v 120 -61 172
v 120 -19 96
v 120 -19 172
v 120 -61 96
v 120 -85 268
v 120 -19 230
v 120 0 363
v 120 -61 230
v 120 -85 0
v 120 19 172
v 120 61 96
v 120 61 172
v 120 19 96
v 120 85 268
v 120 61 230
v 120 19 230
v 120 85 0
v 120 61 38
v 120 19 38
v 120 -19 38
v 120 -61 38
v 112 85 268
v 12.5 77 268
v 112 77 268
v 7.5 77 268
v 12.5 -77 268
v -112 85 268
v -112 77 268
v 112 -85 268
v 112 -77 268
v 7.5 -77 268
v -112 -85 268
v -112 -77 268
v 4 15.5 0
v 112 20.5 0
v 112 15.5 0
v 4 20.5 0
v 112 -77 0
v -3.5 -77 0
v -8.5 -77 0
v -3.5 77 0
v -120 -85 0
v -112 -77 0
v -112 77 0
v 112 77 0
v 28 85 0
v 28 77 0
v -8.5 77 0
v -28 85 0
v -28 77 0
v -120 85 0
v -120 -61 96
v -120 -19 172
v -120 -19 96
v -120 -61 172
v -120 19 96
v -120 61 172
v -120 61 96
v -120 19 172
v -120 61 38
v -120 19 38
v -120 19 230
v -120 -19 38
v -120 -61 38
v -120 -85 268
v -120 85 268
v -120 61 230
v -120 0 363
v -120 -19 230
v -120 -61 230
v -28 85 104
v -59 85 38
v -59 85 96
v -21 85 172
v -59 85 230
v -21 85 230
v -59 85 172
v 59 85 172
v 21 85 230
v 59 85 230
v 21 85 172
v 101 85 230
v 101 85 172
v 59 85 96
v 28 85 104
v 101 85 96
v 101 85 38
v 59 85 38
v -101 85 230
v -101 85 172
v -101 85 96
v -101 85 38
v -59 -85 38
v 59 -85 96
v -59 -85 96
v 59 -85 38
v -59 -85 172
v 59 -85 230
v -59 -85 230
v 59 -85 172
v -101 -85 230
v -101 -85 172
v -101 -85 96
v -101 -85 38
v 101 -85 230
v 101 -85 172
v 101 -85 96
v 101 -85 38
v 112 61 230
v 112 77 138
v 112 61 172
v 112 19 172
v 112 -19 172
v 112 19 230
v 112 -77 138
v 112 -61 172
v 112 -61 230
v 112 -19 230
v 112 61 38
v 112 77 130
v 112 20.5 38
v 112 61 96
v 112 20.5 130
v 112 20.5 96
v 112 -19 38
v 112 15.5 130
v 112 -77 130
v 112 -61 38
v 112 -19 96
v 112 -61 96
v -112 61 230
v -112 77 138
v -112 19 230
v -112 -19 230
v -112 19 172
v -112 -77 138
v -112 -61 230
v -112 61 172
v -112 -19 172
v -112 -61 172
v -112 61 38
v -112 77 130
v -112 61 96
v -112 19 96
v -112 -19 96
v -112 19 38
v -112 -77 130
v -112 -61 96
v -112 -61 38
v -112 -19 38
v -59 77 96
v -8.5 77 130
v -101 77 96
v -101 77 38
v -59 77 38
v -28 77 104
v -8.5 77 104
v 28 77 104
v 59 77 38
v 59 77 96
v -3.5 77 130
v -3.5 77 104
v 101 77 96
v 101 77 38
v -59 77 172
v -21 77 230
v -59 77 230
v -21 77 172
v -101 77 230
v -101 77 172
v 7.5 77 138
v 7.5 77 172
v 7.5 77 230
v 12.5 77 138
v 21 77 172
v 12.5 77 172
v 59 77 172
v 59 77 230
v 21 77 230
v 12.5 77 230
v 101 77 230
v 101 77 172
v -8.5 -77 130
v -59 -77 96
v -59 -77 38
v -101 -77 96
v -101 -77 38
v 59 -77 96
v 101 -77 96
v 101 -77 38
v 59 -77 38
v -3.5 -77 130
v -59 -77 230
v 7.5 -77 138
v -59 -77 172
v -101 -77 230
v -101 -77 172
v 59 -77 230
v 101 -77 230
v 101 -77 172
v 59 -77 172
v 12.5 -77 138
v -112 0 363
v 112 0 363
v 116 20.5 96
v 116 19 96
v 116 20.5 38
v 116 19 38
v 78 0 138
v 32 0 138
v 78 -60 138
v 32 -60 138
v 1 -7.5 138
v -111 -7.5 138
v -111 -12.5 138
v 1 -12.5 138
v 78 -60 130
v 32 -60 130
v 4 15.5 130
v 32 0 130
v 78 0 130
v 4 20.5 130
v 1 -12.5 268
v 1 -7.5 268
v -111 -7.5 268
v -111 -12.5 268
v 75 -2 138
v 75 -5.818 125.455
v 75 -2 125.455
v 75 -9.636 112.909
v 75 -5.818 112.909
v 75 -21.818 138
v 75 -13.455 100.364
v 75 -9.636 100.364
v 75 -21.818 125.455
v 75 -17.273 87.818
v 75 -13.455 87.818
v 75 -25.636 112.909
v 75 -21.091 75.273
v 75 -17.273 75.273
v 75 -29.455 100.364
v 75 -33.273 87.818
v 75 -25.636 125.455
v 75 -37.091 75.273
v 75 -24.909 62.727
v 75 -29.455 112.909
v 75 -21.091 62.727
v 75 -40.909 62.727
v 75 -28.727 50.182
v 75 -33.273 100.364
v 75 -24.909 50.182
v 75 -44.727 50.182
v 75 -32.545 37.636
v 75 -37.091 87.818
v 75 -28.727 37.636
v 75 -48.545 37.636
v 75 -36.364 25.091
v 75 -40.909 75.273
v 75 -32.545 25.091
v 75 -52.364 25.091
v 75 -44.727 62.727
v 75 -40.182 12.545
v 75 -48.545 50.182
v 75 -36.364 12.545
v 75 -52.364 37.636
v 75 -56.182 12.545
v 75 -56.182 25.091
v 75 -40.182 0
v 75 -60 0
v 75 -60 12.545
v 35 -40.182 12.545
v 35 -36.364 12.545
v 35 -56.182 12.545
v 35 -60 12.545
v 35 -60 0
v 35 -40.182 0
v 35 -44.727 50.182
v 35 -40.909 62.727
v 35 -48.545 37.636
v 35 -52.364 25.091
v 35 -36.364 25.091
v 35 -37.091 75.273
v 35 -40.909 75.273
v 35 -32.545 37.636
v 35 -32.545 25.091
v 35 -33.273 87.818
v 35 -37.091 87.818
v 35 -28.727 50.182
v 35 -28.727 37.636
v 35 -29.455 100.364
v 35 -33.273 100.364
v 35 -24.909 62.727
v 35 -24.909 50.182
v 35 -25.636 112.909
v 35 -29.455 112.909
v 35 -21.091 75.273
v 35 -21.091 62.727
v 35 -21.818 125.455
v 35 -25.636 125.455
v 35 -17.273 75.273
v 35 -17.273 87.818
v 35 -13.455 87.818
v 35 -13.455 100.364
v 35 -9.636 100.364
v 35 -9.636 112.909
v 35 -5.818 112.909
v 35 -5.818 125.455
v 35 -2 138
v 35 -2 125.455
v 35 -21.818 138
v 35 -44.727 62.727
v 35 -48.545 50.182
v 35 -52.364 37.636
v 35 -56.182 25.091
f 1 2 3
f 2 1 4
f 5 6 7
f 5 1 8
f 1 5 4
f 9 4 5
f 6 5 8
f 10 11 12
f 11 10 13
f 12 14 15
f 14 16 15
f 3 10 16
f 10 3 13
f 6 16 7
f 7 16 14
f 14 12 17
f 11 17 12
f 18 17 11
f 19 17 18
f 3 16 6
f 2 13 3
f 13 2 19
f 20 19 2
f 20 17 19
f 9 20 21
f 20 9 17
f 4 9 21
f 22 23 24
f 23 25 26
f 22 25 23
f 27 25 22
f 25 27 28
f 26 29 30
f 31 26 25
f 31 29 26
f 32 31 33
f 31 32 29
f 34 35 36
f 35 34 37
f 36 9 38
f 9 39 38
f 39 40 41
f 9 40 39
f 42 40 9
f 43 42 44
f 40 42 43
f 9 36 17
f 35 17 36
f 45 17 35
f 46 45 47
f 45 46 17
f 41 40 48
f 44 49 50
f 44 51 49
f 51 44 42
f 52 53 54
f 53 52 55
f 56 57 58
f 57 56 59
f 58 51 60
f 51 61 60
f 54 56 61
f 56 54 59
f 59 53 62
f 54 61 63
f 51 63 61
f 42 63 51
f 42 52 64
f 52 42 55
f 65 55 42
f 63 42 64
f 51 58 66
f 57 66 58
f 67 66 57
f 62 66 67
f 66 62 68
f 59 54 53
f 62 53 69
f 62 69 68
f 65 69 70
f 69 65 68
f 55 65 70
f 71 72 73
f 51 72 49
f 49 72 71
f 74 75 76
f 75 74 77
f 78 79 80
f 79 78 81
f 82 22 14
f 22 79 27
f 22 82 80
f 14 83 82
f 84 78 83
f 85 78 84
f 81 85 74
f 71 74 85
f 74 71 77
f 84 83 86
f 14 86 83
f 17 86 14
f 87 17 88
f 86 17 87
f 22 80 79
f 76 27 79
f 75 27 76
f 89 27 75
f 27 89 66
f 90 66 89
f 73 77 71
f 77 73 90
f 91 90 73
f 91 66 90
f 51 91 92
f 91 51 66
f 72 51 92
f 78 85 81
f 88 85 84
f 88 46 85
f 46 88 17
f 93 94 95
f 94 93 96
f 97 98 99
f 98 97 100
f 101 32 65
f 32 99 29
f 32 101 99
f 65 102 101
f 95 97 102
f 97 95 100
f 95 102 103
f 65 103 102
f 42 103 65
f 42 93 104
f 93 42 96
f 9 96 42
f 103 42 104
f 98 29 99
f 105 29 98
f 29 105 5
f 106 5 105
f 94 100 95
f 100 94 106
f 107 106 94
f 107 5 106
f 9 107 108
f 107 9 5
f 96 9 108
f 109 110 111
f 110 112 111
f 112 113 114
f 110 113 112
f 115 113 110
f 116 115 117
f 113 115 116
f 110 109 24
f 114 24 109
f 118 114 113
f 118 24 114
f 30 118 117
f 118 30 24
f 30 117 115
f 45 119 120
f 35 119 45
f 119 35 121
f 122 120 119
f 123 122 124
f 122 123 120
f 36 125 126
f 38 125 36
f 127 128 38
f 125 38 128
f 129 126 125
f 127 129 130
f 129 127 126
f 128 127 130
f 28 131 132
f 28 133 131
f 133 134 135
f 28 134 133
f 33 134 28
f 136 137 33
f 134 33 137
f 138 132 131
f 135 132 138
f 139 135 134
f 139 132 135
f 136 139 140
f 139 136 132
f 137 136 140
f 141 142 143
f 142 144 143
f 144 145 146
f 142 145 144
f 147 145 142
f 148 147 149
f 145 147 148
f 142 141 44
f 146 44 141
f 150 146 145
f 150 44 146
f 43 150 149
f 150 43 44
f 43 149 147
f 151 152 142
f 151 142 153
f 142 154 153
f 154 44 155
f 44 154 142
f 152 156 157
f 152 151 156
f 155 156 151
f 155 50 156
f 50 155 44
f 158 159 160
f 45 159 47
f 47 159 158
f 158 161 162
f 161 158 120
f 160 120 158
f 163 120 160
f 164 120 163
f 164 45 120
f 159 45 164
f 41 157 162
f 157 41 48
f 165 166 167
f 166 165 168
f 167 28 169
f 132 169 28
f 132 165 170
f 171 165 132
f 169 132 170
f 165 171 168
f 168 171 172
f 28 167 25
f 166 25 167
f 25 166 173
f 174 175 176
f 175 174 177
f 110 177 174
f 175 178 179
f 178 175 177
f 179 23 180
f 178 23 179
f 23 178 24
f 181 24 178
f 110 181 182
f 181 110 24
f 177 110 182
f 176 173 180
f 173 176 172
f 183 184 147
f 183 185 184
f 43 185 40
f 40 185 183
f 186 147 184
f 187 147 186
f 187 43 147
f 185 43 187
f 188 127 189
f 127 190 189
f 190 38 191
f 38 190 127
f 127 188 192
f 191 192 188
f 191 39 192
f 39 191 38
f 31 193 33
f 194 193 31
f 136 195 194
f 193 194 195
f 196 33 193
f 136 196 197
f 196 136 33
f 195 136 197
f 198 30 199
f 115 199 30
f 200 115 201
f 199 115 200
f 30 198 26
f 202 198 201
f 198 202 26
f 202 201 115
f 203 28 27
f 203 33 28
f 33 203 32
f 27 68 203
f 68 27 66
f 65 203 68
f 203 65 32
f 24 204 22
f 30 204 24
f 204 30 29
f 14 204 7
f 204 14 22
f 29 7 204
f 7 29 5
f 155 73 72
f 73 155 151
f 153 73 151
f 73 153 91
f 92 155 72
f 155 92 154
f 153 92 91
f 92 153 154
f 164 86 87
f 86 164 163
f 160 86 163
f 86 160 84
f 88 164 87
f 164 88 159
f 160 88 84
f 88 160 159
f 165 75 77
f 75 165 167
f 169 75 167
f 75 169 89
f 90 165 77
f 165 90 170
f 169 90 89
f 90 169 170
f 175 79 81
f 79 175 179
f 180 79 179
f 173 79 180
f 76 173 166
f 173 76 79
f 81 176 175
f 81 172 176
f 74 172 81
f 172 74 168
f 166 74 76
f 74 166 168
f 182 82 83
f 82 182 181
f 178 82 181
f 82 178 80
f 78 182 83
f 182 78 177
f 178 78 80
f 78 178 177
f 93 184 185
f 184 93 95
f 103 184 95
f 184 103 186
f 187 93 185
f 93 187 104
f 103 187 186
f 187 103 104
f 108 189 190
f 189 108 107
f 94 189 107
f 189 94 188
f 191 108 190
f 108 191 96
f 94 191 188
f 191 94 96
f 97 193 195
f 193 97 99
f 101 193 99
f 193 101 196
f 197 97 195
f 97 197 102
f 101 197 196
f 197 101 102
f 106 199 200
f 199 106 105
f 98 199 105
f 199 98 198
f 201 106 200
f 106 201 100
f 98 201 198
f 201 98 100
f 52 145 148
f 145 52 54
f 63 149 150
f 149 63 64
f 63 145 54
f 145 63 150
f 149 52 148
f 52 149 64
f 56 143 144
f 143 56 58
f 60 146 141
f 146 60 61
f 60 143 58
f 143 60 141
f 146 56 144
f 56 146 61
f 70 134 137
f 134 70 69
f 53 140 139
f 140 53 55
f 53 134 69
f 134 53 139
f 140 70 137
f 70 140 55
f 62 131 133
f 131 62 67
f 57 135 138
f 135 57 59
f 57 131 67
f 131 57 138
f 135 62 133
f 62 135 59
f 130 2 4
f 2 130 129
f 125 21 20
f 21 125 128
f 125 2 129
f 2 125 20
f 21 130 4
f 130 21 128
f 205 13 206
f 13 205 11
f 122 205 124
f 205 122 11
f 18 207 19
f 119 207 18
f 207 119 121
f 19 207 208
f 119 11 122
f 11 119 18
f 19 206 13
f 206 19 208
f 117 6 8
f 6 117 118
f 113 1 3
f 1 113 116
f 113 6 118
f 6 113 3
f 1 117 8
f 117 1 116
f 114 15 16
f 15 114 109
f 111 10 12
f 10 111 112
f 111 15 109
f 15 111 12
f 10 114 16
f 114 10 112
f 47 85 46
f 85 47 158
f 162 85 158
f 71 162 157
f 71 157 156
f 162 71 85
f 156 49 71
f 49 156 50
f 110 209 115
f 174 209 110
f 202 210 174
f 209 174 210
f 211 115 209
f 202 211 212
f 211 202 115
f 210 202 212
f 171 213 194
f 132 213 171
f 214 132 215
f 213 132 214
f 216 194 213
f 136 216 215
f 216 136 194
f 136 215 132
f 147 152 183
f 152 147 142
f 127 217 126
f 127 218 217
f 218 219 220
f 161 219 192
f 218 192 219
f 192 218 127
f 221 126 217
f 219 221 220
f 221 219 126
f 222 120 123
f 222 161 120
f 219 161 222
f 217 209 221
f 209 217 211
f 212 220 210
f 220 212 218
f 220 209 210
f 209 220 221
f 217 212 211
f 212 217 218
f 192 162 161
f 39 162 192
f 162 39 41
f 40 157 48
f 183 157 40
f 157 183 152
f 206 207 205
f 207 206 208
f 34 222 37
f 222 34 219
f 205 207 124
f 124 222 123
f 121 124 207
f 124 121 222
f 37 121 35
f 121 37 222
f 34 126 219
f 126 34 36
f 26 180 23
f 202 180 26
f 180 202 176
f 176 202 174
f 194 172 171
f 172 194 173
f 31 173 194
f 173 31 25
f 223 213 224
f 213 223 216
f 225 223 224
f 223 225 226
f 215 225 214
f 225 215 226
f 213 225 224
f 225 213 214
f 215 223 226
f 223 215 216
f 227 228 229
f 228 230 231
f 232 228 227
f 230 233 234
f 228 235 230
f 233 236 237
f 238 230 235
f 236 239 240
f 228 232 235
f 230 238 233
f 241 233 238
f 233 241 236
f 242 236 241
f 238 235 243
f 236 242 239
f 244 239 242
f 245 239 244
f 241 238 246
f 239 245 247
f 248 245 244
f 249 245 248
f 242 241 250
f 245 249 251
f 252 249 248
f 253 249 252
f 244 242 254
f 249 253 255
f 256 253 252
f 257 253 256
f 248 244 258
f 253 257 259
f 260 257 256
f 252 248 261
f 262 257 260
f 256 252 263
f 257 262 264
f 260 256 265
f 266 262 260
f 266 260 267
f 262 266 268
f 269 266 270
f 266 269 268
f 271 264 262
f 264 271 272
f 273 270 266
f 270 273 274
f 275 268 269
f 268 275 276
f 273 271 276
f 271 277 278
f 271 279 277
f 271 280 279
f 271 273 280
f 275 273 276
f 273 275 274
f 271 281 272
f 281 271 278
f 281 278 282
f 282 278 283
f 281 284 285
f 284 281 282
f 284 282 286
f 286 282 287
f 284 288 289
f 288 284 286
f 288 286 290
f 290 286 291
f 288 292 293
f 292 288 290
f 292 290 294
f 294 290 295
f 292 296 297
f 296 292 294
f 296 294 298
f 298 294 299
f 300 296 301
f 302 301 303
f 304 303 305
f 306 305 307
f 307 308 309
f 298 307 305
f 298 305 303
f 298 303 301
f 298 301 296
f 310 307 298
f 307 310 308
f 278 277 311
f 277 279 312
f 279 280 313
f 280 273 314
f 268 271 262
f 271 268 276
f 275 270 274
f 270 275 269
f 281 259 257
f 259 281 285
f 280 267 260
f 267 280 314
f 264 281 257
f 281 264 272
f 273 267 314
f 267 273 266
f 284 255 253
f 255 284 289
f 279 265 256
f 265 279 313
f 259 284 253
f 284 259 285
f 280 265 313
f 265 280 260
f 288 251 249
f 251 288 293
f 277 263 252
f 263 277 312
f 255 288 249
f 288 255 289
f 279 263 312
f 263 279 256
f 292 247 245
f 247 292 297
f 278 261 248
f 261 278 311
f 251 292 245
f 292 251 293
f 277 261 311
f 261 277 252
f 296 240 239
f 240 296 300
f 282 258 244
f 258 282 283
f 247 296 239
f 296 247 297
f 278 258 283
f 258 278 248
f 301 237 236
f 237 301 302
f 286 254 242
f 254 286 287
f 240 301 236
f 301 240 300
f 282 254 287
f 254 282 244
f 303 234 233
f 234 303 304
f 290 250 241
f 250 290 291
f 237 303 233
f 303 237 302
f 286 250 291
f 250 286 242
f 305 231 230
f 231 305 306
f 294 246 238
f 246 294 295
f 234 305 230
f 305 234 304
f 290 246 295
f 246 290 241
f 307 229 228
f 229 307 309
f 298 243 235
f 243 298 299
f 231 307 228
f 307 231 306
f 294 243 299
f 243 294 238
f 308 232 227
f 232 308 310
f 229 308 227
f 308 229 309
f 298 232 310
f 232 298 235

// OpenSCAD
// file: common.scad
// Shared parameters and placement helpers for the dollhouse.
// `include`d by every component file so variables AND helper modules propagate.

$fa = 2;
$fs = 0.5;
eps = 0.1;

// ---- Core house dimensions (mm) ----
house_w = 240;          // width  (X)
house_d = 170;          // depth  (Y)
wall_t  = 8;            // exterior wall thickness
floor_h = 130;          // interior storey height
mid_t   = 8;            // mid-floor slab thickness
wall_height = floor_h * 2 + mid_t;   // 268
half_depth  = house_d / 2;           // 85

// ---- Roof ----
gable_rise = 95;
ridge_z    = wall_height + gable_rise;   // 363
over_x     = 18;        // gable-end overhang
over_y     = 18;        // eave overhang
roof_w     = house_w + 2 * over_x;       // 276
roof_t     = 9;
ridge_r    = 7;
theta      = atan(gable_rise / half_depth);
panel_len  = (half_depth + over_y) / cos(theta);

// ---- Foundation ----
foundation_h    = 18;
foundation_over = 14;

// ---- Windows ----
win_w   = 42;
win_h   = 58;
frame_w = 6;
frame_t_out = 5;        // how far trim/frame protrudes outside
mull_w  = 3;
ground_z = 67;          // window centre, ground floor
upper_z  = 201;         // window centre, upper floor

// ---- Door ----
door_w = 56;
door_h = 104;

// ---- Chimney ----
chimney_w   = 26;
chimney_d   = 22;
chimney_x   = -72;
chimney_y   = 38;
chimney_base_z = 250;
chimney_top = ridge_z + 40;   // 403

// ---- Window / opening placement lists [u, z_centre] ----
front_windows = [[-80, ground_z], [80, ground_z],
                 [-80, upper_z], [0, upper_z], [80, upper_z]];
back_windows  = [[-80, ground_z], [80, ground_z],
                 [-80, upper_z], [80, upper_z]];
side_windows  = [[-40, ground_z], [40, ground_z],
                 [-40, upper_z], [40, upper_z]];

// ---- Colours ----
col_wall    = "#F2E7CE";
col_roof    = "#9B3B2E";
col_trim    = "#FBFBF7";
col_door    = "#3C5A78";
col_found   = "#9A968E";
col_glass   = "#AFC9DE";
col_chimney = "#A14B36";
col_shutter = "#46603F";
col_stair   = "#C8A97E";

// ---- Helpers ----------------------------------------------------------

// Position children flush against a given exterior face, local +Y = outward.
module place_on_face(face, u, z) {
    if (face == "front")
        translate([u, half_depth, z]) children();
    else if (face == "back")
        translate([u, -half_depth, z]) rotate([0, 0, 180]) children();
    else if (face == "left")
        translate([-house_w / 2, u, z]) rotate([0, 0, 90]) children();
    else
        translate([house_w / 2, u, z]) rotate([0, 0, -90]) children();
}

// Solid that pierces a wall to make a window/door opening.
module opening_cut(face, u, z, w, h) {
    if (face == "front")
        translate([u, half_depth - wall_t / 2, z])
            cube([w, wall_t + 4, h], center = true);
    else if (face == "back")
        translate([u, -(half_depth - wall_t / 2), z])
            cube([w, wall_t + 4, h], center = true);
    else if (face == "left")
        translate([-(house_w / 2 - wall_t / 2), u, z])
            cube([wall_t + 4, w, h], center = true);
    else
        translate([house_w / 2 - wall_t / 2, u, z])
            cube([wall_t + 4, w, h], center = true);
}
// main file
include <common.scad>

// Exterior shell: two-storey box with gable ends, plus the mid-floor slab,
// interior partitions and a staircase. All openings are cut to match the
// window/door placement lists in common.scad.

module wall_shell() {
    color(col_wall)
    difference() {
        union() {
            // Hollow box walls.
            difference() {
                translate([0, 0, wall_height / 2])
                    cube([house_w, house_d, wall_height], center = true);
                translate([0, 0, wall_height / 2 + eps])
                    cube([house_w - 2 * wall_t, house_d - 2 * wall_t,
                          wall_height + 2], center = true);
                // open the bottom so interior is reachable (slab covers it)
            }
            // Gable triangles on the left/right ends, inline so the export
            // keeps the shell as one closed named solid.
            for (s = [-1, 1])
                translate([s * (house_w / 2 - wall_t / 2), 0, wall_height])
                    rotate([90, 0, 90])
                        linear_extrude(height = wall_t, center = true)
                            polygon([[-half_depth, 0], [half_depth, 0], [0, gable_rise]]);
        }
        // ---- cut all openings ----
        for (w = front_windows) opening_cut("front", w[0], w[1], win_w, win_h);
        for (w = back_windows)  opening_cut("back",  w[0], w[1], win_w, win_h);
        for (w = side_windows)  opening_cut("left",  w[0], w[1], win_w, win_h);
        for (w = side_windows)  opening_cut("right", w[0], w[1], win_w, win_h);
        // front door opening
        opening_cut("front", 0, door_h / 2, door_w, door_h);
    }
}

// centred in X/Y but resting on z=0
function false_centre() = [true, true, false];

// Interior mid-floor slab between the two storeys (with a stair opening).
module mid_floor() {
    color(col_stair)
    difference() {
        translate([0, 0, floor_h + mid_t / 2])
            cube([house_w - 2 * wall_t + eps, house_d - 2 * wall_t + eps, mid_t],
                 center = true);
        // stairwell hole
        translate([55, -30, floor_h + mid_t / 2])
            cube([46, 60, mid_t + 4], center = true);
    }
}

// Interior partition walls dividing each floor into rooms.
module partitions() {
    color(col_trim) {
        // ground-floor central partition (X)
        translate([-6, 0, floor_h / 2])
            partition_x(floor_h, [house_d - 2 * wall_t, 5]);
        // ground-floor cross partition (Y) on the right half
        translate([0, 18, floor_h / 2])
            partition_y(floor_h, [house_w / 2 - wall_t, 5], xoff = 60);
        // upper-floor central partition
        translate([10, 0, floor_h + mid_t + floor_h / 2])
            partition_x(floor_h, [house_d - 2 * wall_t, 5]);
        // upper cross partition on left
        translate([0, -10, floor_h + mid_t + floor_h / 2])
            partition_y(floor_h, [house_w / 2 - wall_t, 5], xoff = -55);
    }
}

module partition_x(h, dims) {           // wall running along Y at fixed X
    cube([dims[1], dims[0], h], center = true);
}
module partition_y(h, dims, xoff) {     // wall running along X, offset in X
    translate([xoff, 0, 0])
        cube([dims[0], dims[1], h], center = true);
}

// Straight flight of stairs from ground floor up through the stairwell.
module staircase() {
    n = 11;
    rise = (floor_h + mid_t) / n;
    run  = 42 / n;
    tread = 16;
    color(col_stair)
    translate([55, -52, 0])
        for (i = [0 : n - 1])
            translate([0, i * run + run / 2, i * rise + rise / 2])
                cube([40, run + tread, rise], center = true);
}

module walls() {
    wall_shell();
    mid_floor();
    partitions();
    staircase();
}

walls();
